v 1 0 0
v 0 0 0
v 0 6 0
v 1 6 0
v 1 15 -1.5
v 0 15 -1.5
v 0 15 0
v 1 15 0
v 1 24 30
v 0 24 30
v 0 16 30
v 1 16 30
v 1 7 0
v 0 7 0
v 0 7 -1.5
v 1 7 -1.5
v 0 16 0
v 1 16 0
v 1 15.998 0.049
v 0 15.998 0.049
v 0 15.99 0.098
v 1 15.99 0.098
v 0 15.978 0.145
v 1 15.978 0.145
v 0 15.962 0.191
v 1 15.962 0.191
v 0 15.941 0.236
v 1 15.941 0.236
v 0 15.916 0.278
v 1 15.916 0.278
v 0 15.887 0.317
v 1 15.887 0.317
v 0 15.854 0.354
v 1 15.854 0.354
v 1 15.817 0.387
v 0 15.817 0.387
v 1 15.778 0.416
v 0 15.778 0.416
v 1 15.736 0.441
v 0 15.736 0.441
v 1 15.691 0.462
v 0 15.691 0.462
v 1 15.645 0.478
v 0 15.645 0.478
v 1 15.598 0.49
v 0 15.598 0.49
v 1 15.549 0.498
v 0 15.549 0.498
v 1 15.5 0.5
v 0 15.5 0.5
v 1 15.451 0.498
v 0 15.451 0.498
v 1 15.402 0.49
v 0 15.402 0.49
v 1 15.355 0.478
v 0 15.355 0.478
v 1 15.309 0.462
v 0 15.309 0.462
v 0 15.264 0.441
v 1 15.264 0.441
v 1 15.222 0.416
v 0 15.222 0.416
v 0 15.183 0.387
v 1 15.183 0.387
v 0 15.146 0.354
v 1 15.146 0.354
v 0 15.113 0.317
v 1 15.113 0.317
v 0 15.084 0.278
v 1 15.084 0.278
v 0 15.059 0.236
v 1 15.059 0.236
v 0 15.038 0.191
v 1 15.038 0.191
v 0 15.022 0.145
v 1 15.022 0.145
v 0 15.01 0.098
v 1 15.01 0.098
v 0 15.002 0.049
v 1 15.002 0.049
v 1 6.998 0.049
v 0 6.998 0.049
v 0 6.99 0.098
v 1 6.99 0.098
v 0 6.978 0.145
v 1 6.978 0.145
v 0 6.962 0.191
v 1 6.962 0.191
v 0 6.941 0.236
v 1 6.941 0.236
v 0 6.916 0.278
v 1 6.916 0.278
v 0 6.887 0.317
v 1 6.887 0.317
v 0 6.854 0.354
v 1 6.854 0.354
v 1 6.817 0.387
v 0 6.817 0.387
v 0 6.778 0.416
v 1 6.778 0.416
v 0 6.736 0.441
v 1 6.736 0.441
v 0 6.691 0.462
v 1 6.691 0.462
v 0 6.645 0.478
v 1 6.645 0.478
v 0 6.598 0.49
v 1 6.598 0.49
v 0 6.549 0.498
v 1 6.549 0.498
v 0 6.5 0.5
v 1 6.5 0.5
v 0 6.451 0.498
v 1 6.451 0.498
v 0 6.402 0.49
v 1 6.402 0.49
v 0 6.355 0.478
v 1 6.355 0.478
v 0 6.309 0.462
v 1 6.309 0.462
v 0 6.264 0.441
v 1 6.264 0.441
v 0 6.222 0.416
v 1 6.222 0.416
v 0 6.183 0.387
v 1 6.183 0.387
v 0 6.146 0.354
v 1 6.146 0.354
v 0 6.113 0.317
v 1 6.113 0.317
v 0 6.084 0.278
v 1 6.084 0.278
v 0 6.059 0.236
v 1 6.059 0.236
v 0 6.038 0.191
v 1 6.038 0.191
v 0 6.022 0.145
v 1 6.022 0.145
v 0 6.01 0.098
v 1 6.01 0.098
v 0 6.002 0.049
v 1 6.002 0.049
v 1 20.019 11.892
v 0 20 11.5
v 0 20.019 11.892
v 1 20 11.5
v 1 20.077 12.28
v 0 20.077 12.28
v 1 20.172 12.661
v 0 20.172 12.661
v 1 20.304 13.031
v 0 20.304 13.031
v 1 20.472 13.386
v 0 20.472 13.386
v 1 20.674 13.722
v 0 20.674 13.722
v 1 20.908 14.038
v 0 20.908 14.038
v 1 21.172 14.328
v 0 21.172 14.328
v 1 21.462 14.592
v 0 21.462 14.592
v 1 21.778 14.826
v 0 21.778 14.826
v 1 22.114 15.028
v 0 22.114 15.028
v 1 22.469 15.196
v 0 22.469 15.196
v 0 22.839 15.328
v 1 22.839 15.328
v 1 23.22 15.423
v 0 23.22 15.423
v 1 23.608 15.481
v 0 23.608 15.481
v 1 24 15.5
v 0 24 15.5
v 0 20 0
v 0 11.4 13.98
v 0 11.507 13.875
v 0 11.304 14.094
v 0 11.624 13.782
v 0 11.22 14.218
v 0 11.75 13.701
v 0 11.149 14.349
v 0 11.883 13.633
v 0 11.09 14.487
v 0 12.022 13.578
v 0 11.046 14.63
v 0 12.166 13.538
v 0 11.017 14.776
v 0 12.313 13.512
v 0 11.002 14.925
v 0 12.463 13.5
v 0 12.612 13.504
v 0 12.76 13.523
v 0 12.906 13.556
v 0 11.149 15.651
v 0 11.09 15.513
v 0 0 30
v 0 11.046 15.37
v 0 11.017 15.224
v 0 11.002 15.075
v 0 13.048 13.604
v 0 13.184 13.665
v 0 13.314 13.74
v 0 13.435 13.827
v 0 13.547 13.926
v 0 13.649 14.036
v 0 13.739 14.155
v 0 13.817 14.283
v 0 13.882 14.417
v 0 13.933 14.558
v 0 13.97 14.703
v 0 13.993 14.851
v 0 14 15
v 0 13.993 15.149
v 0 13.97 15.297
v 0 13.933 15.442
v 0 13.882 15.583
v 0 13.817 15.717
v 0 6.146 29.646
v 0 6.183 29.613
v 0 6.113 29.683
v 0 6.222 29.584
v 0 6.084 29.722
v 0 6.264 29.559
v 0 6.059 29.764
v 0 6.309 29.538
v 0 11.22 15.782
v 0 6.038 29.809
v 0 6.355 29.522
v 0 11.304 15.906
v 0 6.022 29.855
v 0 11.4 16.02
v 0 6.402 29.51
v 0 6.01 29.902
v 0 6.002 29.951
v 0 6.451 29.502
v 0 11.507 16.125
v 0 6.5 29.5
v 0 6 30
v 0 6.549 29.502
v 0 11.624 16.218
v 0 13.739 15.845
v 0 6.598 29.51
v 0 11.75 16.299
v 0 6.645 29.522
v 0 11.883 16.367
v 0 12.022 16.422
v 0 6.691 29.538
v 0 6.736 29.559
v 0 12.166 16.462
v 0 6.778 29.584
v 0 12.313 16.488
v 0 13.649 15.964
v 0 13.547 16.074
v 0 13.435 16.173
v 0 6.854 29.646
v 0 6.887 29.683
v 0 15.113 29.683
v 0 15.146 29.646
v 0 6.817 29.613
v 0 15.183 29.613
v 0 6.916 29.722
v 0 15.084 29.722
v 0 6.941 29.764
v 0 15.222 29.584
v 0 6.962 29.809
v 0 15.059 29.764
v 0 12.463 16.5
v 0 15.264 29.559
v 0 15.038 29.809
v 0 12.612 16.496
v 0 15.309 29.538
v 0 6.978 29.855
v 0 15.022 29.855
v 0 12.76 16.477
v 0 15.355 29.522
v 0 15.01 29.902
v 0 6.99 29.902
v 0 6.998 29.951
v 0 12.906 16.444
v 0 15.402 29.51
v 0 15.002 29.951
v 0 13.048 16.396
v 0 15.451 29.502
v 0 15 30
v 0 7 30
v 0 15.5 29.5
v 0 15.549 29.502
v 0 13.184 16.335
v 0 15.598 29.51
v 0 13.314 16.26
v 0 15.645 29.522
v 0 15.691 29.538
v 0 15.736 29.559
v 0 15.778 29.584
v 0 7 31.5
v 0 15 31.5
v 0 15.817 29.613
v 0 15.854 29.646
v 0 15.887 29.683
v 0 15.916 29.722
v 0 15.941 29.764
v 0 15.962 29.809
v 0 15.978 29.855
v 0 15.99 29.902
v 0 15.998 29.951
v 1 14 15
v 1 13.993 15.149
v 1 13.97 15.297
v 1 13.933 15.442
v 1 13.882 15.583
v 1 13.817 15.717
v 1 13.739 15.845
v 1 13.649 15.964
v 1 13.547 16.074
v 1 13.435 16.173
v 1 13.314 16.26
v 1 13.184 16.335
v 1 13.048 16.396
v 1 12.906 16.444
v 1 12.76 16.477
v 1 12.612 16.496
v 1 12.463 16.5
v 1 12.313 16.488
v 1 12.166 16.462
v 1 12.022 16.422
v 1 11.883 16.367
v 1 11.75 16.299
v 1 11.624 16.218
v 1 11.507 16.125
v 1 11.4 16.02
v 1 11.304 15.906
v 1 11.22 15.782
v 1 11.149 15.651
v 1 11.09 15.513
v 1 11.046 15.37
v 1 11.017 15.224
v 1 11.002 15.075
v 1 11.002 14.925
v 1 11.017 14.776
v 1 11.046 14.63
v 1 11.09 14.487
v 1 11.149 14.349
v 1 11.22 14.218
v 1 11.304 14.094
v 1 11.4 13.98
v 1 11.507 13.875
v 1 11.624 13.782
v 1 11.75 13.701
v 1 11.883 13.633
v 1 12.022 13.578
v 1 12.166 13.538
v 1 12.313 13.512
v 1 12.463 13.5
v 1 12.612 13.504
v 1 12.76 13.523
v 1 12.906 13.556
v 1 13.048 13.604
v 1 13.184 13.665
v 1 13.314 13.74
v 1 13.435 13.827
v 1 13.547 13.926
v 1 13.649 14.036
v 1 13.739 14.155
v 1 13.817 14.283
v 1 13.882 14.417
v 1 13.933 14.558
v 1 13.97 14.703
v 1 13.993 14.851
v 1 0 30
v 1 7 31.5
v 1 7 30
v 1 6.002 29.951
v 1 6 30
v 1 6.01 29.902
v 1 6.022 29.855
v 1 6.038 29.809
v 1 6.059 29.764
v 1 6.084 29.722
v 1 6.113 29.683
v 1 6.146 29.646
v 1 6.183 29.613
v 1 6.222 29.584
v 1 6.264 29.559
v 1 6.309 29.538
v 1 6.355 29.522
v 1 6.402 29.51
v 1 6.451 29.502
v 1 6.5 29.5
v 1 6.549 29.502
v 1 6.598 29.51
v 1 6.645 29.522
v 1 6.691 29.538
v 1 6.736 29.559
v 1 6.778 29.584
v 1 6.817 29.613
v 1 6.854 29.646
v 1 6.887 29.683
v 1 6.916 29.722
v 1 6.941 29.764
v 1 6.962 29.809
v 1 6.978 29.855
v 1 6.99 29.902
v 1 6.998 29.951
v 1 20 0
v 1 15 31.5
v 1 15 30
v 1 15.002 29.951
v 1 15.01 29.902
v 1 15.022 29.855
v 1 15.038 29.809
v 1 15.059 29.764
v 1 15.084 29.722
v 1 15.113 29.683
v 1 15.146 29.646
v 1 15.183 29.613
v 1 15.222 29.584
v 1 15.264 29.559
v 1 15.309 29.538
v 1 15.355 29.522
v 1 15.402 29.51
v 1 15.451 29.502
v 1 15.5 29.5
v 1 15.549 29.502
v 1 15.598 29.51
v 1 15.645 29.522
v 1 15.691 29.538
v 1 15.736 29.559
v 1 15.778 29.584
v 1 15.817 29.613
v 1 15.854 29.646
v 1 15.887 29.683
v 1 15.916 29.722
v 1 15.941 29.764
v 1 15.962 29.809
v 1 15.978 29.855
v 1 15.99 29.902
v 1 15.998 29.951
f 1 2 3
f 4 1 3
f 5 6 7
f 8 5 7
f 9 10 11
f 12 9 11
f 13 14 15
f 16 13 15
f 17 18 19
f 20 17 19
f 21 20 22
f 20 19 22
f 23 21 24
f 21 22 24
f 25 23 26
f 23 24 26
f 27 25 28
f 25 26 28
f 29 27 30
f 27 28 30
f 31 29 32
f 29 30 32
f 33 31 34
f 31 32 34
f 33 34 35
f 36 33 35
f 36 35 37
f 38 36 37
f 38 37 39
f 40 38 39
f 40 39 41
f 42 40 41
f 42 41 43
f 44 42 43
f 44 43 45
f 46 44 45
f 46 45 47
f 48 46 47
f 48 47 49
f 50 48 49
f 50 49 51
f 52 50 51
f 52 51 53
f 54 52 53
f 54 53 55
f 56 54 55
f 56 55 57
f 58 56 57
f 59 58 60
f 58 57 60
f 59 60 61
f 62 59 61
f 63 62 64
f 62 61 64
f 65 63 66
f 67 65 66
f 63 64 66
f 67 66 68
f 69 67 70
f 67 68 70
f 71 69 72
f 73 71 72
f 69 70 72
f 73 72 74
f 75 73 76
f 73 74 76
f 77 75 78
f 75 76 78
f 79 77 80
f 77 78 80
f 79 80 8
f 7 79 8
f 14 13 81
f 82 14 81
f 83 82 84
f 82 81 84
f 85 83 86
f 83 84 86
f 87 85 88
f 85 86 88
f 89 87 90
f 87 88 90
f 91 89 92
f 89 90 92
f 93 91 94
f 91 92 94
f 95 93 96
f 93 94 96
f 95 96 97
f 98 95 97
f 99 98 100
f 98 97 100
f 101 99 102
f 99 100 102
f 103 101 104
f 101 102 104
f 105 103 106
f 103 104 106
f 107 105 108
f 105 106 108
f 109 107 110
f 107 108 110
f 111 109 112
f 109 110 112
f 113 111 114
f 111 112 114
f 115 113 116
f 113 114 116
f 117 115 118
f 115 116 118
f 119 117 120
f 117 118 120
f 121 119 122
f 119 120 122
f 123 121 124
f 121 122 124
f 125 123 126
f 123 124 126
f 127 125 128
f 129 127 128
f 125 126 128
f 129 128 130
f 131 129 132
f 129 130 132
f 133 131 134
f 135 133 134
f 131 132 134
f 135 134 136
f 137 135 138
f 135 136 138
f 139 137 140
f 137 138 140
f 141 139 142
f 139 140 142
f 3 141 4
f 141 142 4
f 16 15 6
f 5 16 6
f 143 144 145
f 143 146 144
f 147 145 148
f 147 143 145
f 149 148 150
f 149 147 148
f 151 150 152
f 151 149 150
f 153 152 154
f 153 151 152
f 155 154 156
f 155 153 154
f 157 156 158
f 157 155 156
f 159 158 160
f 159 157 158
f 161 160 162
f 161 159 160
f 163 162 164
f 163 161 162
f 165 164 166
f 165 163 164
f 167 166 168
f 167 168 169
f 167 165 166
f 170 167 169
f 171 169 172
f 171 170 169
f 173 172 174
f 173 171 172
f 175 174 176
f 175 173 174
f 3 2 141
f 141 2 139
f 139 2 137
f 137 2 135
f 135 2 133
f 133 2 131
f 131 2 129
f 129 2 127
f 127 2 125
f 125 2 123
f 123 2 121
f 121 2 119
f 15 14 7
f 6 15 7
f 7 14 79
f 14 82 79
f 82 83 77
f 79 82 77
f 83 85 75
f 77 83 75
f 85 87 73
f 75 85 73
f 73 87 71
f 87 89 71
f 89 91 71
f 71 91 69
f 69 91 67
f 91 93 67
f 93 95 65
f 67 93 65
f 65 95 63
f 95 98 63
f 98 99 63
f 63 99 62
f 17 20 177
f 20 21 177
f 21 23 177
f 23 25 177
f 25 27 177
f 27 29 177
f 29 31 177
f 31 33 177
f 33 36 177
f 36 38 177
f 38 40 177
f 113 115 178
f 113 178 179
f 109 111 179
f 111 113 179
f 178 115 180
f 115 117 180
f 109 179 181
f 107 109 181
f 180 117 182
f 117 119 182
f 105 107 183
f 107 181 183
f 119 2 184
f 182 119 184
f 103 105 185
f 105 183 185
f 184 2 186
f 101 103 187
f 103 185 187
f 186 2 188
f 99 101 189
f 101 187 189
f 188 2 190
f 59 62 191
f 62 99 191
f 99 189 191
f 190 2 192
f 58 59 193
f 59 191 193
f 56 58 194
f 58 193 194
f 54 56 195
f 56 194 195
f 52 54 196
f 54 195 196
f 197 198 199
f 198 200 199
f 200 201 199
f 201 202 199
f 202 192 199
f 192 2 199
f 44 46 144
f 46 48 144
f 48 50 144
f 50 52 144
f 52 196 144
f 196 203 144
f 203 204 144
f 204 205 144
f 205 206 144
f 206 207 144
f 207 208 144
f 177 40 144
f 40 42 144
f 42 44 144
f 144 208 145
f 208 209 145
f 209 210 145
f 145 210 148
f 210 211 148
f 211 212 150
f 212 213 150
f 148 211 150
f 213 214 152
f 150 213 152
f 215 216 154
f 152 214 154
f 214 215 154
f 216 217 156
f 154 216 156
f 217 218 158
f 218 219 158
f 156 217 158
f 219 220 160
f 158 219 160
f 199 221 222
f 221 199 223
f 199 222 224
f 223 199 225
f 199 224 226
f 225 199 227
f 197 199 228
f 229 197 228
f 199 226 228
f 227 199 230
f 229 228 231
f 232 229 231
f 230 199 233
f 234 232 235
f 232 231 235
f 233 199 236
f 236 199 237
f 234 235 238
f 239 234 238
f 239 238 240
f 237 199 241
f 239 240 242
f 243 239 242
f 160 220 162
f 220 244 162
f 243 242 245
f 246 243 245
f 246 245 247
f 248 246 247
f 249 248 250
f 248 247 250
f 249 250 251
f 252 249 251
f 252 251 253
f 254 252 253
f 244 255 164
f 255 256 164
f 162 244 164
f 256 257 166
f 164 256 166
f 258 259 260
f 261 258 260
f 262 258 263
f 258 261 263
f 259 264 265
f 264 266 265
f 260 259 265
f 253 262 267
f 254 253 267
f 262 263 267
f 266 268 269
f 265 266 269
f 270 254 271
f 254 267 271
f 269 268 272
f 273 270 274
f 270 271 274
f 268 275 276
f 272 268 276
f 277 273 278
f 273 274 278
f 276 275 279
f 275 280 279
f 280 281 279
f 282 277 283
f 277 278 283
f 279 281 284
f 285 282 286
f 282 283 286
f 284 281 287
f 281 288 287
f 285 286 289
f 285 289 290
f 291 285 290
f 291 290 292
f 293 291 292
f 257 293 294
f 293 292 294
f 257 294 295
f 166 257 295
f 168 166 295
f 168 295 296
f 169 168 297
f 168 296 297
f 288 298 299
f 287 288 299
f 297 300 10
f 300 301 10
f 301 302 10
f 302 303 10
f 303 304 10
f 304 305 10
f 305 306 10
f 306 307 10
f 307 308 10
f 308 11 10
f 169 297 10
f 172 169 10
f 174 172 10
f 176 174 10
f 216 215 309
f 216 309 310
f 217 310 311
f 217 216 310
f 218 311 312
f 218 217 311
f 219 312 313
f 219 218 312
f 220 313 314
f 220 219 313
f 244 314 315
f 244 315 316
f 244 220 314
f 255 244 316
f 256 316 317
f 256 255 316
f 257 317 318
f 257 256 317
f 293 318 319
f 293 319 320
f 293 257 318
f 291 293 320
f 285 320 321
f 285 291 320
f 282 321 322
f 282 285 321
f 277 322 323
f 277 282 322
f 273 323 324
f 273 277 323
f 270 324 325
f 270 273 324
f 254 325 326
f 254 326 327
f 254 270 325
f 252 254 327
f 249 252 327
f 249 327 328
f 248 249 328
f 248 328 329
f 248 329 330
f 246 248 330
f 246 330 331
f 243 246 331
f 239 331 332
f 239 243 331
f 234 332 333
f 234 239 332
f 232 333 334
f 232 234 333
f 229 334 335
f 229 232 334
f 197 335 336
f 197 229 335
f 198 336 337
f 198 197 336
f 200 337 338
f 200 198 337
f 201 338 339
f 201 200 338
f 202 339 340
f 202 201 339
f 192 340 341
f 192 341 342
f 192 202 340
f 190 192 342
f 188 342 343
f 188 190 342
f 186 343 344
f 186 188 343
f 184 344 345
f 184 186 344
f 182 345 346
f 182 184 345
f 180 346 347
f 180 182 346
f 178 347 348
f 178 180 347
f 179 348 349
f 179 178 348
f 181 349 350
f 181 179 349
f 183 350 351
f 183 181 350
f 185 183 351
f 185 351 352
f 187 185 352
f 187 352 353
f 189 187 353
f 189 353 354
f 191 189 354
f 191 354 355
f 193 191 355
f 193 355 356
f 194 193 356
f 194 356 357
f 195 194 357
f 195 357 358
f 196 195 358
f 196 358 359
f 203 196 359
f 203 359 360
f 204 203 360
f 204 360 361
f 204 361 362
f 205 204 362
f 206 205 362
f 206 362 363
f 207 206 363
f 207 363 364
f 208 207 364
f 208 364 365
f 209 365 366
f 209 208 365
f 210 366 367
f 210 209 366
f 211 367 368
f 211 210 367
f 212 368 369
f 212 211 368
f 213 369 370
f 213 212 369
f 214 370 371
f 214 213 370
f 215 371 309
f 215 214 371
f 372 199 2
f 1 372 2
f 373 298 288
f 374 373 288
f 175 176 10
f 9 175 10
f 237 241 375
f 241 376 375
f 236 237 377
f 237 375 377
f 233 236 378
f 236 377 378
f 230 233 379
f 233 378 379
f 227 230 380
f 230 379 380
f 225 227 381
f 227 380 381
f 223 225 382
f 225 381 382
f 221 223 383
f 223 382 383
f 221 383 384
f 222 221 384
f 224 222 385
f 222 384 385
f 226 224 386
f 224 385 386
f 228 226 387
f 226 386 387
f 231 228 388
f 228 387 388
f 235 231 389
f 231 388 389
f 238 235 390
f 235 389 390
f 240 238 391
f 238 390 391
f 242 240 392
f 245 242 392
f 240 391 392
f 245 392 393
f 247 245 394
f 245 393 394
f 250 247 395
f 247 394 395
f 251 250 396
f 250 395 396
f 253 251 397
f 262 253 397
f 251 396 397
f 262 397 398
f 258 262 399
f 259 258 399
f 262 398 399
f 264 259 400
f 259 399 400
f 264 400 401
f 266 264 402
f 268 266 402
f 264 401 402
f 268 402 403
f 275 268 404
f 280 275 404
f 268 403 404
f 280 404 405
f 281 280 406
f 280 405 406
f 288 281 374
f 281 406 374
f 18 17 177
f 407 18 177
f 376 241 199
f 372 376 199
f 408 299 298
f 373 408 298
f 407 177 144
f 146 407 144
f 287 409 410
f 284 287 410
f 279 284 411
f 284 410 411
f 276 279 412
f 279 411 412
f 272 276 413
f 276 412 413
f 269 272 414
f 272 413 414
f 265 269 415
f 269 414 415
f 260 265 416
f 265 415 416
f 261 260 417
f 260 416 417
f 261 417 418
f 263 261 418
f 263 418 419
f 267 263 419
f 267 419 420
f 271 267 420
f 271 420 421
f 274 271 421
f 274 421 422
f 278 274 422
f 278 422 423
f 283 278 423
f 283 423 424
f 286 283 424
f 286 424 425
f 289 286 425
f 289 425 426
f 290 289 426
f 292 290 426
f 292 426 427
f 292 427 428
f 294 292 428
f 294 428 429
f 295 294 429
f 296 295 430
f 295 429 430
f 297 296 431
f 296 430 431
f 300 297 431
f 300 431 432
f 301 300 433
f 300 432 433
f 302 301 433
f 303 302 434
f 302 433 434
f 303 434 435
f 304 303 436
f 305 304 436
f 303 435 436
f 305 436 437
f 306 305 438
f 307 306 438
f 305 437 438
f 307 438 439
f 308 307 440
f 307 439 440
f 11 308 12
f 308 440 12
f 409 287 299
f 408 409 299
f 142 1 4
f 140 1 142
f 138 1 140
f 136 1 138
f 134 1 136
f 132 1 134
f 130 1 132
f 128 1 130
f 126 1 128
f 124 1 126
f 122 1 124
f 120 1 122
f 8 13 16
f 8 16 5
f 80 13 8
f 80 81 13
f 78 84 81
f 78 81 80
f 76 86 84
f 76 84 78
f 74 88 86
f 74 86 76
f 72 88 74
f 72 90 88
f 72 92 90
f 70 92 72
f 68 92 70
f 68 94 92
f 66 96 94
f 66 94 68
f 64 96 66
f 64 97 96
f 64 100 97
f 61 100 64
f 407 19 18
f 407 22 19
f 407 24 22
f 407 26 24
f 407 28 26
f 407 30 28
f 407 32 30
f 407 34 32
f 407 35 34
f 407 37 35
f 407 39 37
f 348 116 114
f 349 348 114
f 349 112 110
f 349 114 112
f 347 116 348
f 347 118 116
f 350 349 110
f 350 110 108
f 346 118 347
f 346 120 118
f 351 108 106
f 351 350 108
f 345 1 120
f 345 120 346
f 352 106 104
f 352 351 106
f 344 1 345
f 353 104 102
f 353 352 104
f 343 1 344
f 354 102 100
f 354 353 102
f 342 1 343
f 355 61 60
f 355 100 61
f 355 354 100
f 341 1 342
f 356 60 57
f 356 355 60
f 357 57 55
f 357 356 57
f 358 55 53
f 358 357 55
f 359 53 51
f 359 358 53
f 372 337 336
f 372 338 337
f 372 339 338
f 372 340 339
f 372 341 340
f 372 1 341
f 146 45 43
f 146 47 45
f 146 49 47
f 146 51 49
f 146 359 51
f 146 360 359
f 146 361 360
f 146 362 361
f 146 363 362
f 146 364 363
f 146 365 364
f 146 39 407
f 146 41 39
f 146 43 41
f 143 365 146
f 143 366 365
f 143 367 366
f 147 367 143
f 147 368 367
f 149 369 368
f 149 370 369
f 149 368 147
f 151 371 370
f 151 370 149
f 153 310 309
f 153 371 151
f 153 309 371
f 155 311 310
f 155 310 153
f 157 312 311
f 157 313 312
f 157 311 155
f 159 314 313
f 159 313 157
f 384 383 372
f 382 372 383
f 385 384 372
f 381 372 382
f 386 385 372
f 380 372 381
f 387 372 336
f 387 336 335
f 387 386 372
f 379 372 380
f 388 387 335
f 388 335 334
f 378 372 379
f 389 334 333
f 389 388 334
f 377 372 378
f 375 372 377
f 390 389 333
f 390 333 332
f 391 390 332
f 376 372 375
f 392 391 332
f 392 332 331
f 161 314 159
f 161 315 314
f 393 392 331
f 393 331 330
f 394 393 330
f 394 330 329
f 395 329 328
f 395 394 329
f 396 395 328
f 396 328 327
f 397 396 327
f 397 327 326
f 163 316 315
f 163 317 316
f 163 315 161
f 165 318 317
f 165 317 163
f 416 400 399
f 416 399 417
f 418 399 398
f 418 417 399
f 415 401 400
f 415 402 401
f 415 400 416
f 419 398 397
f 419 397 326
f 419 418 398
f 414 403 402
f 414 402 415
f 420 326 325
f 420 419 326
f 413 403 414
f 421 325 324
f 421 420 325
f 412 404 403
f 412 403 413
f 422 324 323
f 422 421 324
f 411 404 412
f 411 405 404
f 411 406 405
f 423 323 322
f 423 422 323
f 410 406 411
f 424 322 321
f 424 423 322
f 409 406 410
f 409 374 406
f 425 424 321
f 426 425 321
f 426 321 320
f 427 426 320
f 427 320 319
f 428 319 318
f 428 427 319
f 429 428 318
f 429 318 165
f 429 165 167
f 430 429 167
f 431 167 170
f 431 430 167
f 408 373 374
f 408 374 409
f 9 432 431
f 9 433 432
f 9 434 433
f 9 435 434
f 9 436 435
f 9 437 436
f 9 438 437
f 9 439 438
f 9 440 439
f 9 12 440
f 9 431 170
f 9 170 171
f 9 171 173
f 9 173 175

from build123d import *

# Parameters (mm, degrees)
F0_R     = 1.5
F1_DEPTH = 1
F2_R     = 3.99999
F3_R     = 0.5
F4_DEPTH = 25


# Not quite as in the source:
# - a fillet or chamfer is up to 0.001 mm smaller than in the source, because OpenCascade refuses the exact size


with BuildPart() as f1:
    # F0 (on Right) → F1 (new body)
    with BuildSketch(Plane.YZ):
        Polygon((0, 30), (0, 0), (7, 0), (7, -1.5), (15, -1.5), (15, 0), (20, 0), (20, 15.5), (24, 15.5), (24, 30), (15, 30), (15, 31.5), (7, 31.5), (7, 30), align=None)
        with Locations((12.5, 15)):
            Circle(F0_R, mode=Mode.SUBTRACT)
    extrude(amount=F1_DEPTH)

    # F2 (radius 4 in the source; OpenCascade refuses exactly that, so slightly less here)
    f2_edges = [f1.edges().sort_by_distance(p)[0] for p in [
        (0.5, 20, 15.5),
    ]]
    fillet(f2_edges, radius=F2_R)

    # F3 (on face) → F4 (cut)
    with BuildSketch(Plane.YZ.offset(1)):
        with Locations((6.5, 30)):
            Circle(F3_R)
        with Locations((15.5, 30)):
            Circle(F3_R)
        with Locations((6.5, 0)):
            Circle(F3_R)
        with Locations((15.5, 0)):
            Circle(F3_R)
    extrude(amount=-F4_DEPTH, mode=Mode.SUBTRACT)


solid = f1.part
